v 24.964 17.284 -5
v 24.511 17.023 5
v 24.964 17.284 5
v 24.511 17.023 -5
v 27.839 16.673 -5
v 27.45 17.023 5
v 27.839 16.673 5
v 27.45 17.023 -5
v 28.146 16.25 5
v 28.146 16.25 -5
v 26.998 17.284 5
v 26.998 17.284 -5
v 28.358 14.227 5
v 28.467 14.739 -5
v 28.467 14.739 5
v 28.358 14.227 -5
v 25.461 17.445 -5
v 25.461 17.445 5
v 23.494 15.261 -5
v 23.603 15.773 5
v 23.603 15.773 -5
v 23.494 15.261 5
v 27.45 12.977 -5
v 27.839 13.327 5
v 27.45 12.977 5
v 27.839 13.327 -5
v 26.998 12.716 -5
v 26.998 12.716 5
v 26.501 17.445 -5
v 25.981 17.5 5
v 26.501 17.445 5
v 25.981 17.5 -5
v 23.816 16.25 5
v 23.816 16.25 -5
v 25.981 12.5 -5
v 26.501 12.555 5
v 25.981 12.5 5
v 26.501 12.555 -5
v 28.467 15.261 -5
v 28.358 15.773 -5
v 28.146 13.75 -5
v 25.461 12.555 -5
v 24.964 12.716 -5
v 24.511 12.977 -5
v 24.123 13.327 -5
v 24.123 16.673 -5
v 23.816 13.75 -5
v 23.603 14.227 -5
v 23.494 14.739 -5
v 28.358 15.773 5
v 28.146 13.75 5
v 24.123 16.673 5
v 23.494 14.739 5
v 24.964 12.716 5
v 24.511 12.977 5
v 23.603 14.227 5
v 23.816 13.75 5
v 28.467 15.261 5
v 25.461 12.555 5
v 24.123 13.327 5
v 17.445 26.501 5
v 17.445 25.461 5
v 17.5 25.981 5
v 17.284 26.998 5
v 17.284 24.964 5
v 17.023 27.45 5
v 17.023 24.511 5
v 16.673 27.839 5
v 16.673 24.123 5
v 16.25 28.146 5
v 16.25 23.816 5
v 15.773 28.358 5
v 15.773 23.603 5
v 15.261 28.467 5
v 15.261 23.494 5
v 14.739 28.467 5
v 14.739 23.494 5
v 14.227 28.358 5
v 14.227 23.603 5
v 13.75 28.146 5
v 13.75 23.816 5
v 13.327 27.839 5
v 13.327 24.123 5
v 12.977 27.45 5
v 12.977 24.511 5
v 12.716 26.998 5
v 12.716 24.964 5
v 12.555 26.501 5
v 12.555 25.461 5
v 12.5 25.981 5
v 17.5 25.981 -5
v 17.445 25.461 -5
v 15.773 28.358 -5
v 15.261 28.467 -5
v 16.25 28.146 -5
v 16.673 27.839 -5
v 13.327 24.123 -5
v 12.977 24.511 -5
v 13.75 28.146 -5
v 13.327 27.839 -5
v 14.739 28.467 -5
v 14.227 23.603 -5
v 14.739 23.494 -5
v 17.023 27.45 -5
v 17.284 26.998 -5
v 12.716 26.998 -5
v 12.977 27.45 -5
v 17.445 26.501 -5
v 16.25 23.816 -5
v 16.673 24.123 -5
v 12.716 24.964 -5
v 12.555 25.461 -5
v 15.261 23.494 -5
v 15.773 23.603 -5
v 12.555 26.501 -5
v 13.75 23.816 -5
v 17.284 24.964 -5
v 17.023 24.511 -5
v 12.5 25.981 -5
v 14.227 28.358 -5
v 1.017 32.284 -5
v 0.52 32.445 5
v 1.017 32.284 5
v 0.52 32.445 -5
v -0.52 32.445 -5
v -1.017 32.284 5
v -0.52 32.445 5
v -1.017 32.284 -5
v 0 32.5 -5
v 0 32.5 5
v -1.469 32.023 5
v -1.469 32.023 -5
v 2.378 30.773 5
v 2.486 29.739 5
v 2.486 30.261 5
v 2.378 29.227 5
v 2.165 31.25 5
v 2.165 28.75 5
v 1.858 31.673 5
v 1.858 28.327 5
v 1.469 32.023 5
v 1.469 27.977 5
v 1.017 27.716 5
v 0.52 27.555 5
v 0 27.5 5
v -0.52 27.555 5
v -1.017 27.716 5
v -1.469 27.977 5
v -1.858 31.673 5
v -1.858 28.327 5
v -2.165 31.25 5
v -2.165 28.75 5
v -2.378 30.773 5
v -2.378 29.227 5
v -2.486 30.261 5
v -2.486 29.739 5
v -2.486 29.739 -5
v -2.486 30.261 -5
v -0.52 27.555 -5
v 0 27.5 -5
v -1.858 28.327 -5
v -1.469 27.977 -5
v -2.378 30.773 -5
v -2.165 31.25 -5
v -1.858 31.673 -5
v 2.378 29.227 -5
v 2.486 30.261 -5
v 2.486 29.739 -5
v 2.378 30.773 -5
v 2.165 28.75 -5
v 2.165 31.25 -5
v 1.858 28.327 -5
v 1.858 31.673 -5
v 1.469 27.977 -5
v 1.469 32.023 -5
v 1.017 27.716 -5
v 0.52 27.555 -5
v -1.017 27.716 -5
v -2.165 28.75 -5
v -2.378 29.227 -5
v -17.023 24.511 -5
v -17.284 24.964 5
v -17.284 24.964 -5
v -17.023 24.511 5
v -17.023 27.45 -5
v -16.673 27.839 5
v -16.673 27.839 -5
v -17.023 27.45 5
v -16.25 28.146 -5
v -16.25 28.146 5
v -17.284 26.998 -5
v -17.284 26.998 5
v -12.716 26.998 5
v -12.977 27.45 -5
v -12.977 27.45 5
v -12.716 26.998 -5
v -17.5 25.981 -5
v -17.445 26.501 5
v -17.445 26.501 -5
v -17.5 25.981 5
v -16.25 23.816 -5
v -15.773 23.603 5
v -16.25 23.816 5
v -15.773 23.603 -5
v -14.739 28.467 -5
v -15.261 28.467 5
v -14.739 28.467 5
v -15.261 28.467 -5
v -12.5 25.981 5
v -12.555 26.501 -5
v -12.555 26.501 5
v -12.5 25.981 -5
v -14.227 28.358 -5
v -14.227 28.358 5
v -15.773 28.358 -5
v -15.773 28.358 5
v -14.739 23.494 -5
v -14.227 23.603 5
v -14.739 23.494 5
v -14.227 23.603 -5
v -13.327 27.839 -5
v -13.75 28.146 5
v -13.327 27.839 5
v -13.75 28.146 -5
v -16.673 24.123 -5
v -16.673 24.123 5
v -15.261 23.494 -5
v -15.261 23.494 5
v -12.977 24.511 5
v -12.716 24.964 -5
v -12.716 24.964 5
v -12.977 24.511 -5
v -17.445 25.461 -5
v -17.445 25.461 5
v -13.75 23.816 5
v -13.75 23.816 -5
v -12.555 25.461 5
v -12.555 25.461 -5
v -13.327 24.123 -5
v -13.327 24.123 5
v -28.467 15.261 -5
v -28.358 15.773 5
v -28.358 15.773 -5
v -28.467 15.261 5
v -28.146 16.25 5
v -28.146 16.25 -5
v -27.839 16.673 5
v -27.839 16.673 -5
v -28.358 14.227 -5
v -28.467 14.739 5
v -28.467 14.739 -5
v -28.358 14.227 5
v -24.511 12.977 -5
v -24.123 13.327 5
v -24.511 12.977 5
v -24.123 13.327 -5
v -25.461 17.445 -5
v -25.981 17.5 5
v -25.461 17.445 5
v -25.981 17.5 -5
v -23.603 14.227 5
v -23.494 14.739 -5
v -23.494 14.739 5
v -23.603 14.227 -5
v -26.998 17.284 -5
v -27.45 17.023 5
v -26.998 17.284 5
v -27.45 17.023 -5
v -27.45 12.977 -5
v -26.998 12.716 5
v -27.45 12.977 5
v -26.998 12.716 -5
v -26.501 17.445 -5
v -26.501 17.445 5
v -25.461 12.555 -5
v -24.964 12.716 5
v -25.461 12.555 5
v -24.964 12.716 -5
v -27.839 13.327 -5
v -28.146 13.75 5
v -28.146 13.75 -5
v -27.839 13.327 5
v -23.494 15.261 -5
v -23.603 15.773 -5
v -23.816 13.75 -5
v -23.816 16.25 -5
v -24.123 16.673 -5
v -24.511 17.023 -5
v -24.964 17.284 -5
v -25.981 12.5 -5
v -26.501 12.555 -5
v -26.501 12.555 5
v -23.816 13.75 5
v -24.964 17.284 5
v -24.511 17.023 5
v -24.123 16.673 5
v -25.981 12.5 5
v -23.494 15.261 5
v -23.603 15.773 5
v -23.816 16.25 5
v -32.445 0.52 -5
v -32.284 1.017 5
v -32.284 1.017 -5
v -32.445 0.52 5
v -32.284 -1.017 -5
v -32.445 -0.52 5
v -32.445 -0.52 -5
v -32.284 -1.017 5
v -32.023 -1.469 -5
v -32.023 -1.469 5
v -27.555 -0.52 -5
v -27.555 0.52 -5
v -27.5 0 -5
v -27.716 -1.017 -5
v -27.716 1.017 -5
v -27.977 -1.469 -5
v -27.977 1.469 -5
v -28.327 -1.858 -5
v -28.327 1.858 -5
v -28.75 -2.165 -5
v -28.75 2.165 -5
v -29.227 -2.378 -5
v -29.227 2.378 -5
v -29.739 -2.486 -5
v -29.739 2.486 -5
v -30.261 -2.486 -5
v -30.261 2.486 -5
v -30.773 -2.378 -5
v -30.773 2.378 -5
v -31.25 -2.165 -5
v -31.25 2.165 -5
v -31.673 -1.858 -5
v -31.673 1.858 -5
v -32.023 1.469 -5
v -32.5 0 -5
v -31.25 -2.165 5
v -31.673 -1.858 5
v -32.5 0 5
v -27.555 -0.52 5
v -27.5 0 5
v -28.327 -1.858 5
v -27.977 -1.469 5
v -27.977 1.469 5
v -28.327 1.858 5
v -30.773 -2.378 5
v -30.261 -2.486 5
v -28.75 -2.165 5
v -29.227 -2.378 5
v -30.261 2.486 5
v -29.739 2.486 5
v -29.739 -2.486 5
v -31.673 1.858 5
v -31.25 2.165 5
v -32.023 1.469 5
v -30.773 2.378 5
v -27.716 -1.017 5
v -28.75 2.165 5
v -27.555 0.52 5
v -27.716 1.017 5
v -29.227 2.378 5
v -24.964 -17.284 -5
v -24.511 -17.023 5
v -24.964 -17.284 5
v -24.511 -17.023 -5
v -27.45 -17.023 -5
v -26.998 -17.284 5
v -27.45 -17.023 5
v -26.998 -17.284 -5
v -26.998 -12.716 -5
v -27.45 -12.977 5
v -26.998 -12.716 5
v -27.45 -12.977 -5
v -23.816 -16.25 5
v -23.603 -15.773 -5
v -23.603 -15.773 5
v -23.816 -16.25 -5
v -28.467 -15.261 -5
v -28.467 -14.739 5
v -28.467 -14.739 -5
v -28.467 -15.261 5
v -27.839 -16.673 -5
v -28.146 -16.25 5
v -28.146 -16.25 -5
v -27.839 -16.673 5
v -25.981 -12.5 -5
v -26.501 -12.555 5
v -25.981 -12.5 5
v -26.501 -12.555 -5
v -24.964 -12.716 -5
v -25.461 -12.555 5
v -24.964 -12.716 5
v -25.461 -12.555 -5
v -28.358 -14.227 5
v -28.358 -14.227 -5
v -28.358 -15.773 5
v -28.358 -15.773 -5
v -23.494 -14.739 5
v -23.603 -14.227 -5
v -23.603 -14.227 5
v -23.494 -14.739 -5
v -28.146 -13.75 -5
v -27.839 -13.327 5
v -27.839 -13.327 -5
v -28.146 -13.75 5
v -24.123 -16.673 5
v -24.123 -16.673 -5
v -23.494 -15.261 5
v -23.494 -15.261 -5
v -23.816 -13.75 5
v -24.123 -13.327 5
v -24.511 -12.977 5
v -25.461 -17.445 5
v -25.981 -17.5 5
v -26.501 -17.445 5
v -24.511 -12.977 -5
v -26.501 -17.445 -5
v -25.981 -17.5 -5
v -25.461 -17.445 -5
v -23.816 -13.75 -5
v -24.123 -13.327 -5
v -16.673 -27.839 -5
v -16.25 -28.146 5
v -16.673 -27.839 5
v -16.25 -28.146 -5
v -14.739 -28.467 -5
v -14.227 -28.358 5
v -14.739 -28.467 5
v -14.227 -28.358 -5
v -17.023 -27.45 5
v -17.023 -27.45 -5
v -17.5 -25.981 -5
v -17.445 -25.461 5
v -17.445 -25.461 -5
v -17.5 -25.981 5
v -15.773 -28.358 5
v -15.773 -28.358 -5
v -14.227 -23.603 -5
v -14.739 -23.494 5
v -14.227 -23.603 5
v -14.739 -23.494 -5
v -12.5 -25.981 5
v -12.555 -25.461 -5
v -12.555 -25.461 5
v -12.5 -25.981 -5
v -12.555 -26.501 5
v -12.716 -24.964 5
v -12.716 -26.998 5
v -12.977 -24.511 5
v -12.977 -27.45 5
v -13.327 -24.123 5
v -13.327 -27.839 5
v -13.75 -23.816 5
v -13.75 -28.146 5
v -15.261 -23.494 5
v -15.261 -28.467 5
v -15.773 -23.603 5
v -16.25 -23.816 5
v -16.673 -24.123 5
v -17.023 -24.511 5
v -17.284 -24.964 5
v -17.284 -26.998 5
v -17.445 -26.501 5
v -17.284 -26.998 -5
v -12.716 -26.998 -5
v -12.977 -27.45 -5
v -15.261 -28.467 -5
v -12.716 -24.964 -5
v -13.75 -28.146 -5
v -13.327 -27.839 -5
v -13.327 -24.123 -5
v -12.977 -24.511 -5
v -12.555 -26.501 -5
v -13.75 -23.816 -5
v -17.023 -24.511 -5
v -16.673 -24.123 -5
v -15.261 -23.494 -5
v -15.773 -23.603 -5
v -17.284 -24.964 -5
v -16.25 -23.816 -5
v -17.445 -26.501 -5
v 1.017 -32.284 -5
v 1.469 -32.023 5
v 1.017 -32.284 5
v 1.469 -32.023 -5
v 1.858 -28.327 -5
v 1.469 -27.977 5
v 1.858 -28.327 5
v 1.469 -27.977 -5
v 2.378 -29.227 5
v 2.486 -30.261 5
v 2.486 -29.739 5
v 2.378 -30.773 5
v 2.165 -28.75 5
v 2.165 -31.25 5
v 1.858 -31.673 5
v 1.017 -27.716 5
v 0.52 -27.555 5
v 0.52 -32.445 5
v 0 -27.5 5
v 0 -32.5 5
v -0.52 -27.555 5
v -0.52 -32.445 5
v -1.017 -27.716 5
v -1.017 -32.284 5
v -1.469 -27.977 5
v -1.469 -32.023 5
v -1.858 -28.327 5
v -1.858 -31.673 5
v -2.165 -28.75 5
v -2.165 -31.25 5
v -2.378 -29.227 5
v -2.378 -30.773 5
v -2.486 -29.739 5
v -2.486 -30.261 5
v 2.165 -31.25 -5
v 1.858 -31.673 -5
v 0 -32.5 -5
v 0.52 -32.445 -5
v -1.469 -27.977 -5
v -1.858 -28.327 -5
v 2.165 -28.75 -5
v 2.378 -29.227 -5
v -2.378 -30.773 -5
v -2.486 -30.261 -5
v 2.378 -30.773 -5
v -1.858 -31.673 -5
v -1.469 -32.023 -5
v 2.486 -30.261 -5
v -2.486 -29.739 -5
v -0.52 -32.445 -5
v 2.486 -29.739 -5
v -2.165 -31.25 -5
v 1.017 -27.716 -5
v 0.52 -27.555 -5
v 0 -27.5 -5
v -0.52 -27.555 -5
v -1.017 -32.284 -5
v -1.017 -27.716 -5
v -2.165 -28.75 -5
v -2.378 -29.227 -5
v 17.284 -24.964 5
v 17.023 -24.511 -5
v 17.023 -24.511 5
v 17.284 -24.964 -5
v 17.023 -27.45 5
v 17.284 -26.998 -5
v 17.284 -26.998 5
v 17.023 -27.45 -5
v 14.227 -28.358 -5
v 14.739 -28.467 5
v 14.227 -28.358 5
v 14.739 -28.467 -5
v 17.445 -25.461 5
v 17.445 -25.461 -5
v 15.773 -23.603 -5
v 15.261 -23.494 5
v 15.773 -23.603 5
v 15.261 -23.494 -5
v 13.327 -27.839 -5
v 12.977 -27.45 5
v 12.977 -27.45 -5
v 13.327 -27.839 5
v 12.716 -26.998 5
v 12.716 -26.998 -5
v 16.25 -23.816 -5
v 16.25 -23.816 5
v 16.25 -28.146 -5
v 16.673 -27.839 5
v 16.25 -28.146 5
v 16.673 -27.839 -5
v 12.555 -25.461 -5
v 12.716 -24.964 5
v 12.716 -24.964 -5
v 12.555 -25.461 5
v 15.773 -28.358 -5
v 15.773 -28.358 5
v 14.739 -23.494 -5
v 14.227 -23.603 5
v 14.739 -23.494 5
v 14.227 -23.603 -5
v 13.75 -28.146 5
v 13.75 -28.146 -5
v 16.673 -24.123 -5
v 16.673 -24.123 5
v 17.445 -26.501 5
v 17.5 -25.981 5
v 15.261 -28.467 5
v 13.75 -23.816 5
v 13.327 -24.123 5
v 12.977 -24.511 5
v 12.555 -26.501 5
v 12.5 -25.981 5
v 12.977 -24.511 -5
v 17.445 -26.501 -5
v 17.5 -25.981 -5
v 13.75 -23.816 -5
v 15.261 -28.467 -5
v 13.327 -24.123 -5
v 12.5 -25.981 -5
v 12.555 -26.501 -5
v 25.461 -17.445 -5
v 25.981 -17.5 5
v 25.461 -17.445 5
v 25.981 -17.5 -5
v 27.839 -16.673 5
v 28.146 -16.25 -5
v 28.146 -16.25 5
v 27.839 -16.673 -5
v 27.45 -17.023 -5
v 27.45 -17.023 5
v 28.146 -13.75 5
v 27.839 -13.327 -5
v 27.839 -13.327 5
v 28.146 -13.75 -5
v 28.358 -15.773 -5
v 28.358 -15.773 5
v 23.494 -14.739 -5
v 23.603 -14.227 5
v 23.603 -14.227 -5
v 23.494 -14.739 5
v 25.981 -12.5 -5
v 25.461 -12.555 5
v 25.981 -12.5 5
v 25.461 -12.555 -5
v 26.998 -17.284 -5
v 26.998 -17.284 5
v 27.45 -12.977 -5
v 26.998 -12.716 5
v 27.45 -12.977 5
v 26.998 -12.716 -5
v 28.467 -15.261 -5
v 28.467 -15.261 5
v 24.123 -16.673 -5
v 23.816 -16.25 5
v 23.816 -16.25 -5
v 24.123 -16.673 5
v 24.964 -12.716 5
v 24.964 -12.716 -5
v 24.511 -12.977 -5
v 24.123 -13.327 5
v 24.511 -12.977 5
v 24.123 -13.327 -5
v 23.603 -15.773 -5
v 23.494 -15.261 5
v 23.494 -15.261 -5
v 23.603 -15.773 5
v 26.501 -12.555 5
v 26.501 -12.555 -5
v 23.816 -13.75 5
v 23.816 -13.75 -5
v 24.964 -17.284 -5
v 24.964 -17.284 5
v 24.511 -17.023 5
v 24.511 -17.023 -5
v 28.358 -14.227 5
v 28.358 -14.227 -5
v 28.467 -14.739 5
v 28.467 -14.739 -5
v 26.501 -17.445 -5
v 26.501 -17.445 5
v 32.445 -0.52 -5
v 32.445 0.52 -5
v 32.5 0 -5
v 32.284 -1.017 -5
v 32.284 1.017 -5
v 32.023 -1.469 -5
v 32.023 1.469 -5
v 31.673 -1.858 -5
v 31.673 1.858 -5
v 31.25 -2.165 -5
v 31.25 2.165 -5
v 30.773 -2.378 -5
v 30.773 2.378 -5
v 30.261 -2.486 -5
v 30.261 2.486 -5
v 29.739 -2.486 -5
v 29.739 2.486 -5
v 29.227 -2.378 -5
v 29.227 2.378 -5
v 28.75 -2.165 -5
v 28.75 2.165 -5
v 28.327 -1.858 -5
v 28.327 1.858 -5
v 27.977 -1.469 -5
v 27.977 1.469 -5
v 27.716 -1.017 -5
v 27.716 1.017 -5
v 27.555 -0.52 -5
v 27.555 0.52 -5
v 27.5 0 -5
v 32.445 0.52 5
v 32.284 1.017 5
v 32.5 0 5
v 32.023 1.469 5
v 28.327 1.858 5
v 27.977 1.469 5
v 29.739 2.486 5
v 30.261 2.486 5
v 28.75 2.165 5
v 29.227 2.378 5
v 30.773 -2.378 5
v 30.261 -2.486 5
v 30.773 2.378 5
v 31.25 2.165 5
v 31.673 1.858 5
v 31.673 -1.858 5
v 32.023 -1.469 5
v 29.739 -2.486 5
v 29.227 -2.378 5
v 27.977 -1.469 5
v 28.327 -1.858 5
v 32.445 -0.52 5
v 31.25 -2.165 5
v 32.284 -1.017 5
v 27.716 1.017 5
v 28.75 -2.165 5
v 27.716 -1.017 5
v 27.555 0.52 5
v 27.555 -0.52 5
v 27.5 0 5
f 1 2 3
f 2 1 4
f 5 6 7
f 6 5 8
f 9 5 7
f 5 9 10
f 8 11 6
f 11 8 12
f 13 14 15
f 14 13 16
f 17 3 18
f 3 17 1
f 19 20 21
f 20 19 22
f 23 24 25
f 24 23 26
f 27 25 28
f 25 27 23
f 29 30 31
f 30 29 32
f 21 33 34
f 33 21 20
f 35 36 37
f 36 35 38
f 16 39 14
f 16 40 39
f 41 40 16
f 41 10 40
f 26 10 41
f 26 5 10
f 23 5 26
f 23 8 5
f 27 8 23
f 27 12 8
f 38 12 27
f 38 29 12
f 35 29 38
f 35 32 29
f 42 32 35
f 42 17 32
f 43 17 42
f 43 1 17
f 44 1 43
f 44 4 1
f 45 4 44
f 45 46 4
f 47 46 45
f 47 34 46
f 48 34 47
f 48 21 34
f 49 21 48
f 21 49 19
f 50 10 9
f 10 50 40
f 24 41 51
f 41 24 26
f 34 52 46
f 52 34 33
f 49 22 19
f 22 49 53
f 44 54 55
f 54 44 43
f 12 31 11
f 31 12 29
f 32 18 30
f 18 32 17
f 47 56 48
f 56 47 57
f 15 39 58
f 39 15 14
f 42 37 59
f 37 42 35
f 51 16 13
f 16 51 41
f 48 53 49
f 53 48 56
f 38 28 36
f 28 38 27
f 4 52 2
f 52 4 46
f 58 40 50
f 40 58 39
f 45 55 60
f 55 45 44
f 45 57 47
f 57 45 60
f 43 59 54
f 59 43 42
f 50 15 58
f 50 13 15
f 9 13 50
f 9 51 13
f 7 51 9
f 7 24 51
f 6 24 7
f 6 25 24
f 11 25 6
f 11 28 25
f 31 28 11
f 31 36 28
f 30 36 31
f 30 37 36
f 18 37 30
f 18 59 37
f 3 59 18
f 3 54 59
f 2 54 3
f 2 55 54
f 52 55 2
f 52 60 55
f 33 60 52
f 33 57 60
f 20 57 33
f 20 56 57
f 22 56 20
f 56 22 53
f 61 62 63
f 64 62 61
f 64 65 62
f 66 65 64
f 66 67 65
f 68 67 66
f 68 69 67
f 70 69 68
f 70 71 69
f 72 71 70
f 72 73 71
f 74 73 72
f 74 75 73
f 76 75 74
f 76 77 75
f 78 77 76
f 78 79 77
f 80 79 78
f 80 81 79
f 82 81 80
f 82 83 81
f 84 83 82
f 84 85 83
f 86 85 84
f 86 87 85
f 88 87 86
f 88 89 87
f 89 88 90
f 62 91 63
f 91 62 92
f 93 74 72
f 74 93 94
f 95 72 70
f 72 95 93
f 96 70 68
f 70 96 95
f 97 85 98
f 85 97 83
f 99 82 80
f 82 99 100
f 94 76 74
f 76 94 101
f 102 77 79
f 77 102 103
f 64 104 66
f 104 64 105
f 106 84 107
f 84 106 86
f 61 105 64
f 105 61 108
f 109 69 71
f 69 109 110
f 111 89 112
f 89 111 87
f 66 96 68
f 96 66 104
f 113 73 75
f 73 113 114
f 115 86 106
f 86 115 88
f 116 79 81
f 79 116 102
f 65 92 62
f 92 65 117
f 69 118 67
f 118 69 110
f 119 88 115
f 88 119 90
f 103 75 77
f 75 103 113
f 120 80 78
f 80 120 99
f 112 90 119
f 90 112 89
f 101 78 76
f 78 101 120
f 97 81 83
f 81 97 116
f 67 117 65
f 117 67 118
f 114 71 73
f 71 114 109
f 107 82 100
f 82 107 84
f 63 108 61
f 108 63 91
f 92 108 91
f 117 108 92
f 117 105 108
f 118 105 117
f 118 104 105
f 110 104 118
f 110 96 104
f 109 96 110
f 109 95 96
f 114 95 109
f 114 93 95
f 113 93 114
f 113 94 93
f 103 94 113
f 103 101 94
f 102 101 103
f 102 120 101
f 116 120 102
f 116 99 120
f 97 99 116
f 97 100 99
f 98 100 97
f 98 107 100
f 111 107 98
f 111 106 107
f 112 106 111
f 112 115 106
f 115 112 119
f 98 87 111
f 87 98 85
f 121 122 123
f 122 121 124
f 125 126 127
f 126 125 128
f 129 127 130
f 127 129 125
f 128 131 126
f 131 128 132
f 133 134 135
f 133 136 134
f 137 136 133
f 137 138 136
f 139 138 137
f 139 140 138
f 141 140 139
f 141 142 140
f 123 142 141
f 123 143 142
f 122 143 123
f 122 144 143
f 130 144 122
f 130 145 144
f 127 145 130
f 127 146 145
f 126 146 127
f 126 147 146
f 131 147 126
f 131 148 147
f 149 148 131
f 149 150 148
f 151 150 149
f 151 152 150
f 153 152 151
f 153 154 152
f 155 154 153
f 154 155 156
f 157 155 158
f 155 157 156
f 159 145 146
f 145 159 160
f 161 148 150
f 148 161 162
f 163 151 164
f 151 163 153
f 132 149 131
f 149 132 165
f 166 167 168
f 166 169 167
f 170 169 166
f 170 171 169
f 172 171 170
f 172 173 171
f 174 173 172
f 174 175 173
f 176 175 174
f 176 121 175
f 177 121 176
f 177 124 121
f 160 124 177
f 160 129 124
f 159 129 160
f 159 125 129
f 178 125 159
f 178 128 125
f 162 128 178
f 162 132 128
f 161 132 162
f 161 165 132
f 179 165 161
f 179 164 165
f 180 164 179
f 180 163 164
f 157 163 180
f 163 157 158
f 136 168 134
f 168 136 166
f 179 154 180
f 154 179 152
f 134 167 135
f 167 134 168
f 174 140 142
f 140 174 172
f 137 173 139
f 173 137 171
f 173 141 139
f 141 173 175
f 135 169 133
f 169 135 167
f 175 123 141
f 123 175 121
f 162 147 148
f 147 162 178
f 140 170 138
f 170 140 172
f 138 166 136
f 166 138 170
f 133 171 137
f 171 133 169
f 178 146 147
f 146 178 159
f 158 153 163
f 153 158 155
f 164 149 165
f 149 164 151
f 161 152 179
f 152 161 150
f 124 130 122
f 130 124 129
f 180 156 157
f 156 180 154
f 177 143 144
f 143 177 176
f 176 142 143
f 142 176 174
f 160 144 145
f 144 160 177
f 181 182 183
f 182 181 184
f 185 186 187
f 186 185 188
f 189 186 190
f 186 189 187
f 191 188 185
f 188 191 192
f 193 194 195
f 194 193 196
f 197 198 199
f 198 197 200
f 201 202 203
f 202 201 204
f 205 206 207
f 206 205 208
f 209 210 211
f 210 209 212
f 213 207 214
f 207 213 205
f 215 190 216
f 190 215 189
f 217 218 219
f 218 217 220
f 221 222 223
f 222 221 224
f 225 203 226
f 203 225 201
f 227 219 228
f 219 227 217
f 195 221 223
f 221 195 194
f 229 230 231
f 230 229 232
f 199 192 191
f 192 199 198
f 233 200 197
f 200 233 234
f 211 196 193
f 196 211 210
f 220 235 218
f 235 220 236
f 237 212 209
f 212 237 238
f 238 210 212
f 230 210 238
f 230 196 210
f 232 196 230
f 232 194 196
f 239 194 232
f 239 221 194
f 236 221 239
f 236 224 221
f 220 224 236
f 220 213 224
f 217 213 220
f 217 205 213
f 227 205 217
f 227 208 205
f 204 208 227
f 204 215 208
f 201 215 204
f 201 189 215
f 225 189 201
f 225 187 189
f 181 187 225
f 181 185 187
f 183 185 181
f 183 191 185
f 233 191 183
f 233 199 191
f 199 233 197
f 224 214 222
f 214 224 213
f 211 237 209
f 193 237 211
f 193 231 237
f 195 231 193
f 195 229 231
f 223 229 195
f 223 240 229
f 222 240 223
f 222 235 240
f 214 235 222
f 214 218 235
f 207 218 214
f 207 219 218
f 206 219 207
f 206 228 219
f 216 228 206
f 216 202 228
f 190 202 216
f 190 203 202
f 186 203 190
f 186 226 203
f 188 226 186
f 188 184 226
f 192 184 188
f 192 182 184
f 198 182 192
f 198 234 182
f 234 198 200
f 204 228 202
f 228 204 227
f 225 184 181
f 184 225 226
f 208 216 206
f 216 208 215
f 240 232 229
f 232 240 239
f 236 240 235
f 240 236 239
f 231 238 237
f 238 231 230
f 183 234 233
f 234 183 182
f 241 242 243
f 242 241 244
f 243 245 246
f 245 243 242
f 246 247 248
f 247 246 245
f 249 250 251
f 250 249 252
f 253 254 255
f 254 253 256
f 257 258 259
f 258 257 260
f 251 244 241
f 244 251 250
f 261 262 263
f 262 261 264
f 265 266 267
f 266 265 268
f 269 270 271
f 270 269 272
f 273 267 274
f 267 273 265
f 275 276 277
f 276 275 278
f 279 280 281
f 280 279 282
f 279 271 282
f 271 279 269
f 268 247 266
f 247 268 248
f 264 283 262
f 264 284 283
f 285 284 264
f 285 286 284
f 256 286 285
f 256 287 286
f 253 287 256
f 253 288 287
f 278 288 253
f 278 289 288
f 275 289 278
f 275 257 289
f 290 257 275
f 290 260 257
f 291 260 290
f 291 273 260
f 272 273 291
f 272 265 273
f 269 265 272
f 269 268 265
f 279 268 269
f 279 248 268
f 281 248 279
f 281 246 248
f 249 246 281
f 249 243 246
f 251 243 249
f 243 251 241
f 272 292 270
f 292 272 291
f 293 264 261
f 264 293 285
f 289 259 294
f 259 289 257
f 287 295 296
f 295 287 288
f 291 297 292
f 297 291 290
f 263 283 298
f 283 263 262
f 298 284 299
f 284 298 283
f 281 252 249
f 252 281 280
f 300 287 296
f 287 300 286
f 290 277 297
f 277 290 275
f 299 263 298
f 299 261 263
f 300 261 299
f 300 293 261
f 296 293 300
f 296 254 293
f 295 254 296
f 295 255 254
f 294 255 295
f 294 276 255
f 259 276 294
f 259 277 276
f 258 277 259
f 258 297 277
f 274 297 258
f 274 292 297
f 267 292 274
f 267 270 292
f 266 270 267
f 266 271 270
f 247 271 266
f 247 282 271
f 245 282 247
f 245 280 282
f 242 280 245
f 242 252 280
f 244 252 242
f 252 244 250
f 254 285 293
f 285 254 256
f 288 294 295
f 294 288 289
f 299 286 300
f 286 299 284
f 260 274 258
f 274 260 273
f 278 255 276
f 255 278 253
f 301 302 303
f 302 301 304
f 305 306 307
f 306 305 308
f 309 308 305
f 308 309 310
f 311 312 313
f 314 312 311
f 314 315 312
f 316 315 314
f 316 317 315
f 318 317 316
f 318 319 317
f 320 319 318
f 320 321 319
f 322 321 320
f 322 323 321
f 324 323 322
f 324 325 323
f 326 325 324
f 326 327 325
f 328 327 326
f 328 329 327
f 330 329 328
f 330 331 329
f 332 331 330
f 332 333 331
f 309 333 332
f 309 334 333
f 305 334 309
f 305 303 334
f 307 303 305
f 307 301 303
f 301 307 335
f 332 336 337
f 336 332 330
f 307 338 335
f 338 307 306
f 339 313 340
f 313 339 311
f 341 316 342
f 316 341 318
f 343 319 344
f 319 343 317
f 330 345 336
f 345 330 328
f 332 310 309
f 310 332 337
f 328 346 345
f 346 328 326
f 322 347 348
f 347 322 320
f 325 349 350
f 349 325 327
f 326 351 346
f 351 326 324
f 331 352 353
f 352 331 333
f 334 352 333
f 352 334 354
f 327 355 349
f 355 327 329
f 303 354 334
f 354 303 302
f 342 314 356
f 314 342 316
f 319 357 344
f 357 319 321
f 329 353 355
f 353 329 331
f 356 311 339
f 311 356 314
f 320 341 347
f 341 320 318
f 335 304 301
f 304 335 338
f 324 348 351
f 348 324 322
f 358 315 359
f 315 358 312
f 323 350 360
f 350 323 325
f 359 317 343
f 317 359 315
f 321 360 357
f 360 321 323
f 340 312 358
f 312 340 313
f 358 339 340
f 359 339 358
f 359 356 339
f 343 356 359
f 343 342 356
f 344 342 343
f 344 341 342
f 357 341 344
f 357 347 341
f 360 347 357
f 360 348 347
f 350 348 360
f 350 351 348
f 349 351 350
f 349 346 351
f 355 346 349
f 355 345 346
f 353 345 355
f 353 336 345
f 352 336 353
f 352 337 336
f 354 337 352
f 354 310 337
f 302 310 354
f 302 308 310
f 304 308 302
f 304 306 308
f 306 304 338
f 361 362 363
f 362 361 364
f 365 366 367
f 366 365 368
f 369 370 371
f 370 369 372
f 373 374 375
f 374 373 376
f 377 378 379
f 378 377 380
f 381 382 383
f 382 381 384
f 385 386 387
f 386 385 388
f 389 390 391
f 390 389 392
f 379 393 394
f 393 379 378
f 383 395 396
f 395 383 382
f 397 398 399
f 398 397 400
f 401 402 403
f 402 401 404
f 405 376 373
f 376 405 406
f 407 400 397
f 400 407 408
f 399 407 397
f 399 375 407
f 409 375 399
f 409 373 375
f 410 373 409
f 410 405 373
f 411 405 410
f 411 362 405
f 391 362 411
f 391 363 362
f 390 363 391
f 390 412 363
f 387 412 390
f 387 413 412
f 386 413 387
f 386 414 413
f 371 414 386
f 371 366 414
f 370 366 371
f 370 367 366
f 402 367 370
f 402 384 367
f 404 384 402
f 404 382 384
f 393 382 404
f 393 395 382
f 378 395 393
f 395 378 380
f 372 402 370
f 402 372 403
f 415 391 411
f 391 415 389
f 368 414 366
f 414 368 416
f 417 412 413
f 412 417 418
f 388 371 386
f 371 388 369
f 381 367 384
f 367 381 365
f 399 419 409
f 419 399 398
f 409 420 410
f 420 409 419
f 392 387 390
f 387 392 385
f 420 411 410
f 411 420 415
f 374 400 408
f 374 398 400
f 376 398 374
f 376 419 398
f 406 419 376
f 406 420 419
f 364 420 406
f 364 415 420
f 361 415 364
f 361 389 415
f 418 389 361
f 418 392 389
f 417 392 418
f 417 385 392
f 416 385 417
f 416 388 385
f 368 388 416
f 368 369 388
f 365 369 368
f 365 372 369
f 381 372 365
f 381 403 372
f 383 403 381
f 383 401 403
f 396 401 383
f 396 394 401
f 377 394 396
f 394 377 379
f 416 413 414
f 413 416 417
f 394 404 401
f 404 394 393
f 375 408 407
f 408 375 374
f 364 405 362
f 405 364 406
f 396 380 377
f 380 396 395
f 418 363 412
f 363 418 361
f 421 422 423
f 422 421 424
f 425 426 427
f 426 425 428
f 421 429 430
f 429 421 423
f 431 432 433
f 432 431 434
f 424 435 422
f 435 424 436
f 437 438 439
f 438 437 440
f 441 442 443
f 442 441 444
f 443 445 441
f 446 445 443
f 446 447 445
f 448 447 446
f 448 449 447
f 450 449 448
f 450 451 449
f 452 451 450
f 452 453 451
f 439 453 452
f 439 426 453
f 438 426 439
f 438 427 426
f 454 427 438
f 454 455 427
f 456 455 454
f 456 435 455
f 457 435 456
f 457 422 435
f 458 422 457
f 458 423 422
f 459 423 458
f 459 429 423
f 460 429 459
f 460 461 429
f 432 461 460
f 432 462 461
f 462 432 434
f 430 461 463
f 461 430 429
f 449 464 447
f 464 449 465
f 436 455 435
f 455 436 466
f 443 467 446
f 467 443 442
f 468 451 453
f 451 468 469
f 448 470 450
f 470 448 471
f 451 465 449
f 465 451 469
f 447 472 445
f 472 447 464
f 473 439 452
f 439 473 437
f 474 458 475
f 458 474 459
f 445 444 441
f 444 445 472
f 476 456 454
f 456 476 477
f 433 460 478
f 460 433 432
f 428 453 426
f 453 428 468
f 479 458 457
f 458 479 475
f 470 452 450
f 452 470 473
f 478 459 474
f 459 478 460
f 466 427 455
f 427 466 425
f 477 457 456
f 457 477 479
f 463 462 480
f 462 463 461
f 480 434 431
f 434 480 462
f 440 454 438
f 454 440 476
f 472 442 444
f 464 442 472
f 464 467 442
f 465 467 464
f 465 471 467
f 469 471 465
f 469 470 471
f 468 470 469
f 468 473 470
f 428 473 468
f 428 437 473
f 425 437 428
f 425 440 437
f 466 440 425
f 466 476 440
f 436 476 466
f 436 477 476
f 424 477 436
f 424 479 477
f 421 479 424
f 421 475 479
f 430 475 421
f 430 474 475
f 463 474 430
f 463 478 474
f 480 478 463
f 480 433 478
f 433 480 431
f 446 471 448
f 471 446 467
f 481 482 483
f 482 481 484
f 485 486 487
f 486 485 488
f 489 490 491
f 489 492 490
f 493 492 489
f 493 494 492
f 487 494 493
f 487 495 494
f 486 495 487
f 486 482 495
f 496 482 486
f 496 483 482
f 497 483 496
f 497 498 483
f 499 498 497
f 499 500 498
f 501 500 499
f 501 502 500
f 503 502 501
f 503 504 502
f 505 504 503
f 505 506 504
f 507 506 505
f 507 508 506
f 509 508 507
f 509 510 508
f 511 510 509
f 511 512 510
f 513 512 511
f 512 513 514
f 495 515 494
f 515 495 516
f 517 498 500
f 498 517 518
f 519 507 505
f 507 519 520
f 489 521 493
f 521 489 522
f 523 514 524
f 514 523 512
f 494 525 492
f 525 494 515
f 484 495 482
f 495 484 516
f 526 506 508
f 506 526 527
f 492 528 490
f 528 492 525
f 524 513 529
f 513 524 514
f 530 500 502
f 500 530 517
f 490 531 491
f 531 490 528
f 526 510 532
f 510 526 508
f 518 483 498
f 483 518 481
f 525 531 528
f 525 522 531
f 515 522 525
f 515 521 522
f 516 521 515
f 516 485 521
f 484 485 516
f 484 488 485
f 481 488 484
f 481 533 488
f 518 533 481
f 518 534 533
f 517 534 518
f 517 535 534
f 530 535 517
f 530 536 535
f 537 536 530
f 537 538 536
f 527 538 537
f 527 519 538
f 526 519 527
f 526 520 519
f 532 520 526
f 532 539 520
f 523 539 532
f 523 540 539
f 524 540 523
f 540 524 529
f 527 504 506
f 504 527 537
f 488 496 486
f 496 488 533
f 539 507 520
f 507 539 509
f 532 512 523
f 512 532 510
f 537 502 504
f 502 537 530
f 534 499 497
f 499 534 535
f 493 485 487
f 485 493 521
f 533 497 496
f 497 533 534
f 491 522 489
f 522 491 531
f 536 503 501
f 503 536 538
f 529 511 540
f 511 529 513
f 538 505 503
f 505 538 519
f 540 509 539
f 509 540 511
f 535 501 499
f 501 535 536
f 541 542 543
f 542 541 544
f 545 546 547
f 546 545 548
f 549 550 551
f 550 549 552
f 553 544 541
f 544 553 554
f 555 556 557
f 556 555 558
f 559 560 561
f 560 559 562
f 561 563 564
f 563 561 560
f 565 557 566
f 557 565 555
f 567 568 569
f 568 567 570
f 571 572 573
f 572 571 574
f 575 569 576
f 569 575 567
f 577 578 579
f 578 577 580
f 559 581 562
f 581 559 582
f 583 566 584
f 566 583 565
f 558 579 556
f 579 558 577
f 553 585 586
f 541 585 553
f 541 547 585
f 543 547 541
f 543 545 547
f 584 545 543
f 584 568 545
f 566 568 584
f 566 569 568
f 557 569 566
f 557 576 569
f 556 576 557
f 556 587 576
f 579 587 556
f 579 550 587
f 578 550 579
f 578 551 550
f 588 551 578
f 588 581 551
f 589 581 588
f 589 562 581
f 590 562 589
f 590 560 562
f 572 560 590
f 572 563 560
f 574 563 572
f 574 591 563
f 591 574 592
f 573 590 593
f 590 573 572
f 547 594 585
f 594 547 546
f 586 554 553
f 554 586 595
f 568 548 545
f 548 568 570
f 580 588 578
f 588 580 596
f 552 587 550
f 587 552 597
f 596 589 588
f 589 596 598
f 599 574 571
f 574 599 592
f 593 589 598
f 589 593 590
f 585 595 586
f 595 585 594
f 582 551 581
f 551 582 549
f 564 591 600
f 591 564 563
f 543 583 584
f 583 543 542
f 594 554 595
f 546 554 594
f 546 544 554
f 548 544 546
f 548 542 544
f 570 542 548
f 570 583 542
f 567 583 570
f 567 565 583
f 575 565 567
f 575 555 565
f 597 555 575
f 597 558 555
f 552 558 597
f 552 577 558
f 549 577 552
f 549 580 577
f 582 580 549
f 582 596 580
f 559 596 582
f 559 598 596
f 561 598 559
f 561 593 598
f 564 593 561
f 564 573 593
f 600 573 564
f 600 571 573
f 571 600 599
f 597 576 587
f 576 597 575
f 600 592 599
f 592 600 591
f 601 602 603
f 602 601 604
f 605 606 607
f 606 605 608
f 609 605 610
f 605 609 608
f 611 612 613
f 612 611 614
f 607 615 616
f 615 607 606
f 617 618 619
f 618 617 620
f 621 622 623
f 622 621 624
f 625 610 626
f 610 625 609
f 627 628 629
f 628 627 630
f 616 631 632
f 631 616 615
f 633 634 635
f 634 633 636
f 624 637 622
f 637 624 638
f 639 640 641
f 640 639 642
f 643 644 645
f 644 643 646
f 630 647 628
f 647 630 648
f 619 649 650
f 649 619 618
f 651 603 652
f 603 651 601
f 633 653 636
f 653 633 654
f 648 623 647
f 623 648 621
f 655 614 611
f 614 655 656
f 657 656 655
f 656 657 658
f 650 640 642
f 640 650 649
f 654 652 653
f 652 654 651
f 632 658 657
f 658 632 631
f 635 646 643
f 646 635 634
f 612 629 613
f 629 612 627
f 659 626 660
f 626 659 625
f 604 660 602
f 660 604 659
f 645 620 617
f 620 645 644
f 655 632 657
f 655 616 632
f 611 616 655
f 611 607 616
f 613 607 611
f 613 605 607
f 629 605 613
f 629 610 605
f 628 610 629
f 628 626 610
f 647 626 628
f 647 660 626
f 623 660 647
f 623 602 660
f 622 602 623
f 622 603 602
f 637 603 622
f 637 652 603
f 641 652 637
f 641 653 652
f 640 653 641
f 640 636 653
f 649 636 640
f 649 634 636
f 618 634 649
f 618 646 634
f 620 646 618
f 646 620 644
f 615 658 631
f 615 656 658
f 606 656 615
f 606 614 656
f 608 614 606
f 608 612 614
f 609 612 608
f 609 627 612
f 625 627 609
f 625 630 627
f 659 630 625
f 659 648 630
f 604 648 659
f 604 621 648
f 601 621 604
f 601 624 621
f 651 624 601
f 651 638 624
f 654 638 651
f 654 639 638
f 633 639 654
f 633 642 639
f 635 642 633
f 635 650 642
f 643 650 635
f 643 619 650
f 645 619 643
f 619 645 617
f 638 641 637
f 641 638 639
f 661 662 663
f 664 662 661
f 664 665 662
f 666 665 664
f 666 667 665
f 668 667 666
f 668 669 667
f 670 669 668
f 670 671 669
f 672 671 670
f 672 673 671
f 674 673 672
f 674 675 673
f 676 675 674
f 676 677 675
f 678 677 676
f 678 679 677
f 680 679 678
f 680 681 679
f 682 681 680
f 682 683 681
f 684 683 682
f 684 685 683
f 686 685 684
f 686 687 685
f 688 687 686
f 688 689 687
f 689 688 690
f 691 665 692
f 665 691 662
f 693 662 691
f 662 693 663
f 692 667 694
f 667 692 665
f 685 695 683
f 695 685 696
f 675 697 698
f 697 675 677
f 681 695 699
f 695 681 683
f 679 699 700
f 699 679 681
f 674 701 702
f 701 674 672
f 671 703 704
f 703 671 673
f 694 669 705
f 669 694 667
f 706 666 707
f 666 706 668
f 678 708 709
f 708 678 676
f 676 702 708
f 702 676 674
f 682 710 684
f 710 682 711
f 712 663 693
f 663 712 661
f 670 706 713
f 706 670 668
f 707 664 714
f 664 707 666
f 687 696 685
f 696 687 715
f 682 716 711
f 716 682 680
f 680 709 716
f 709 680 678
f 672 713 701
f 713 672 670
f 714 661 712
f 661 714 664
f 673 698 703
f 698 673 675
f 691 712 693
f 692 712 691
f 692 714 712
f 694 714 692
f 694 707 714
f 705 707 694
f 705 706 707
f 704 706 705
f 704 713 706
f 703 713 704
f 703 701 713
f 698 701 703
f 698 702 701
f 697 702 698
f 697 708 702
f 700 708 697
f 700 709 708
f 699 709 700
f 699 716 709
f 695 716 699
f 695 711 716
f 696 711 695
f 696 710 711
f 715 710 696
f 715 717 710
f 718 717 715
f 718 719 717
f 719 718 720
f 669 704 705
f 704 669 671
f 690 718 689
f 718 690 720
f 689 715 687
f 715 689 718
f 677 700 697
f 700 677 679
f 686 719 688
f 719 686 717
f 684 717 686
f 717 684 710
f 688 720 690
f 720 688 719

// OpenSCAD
module pcd(degrees, totalDegrees=360){
    count=totalDegrees/degrees;
    for(i=[1 : count]){
        rotate(degrees*i)
        children();
    }
}

module pcdAtFixedDegrees(degrees){
    for(degree=degrees){
        rotate(degree)
        children();
    }
}

pcd(30)
    translate([30,0,0])
        cylinder(h=10,d=5, center=true, $fn=30);
